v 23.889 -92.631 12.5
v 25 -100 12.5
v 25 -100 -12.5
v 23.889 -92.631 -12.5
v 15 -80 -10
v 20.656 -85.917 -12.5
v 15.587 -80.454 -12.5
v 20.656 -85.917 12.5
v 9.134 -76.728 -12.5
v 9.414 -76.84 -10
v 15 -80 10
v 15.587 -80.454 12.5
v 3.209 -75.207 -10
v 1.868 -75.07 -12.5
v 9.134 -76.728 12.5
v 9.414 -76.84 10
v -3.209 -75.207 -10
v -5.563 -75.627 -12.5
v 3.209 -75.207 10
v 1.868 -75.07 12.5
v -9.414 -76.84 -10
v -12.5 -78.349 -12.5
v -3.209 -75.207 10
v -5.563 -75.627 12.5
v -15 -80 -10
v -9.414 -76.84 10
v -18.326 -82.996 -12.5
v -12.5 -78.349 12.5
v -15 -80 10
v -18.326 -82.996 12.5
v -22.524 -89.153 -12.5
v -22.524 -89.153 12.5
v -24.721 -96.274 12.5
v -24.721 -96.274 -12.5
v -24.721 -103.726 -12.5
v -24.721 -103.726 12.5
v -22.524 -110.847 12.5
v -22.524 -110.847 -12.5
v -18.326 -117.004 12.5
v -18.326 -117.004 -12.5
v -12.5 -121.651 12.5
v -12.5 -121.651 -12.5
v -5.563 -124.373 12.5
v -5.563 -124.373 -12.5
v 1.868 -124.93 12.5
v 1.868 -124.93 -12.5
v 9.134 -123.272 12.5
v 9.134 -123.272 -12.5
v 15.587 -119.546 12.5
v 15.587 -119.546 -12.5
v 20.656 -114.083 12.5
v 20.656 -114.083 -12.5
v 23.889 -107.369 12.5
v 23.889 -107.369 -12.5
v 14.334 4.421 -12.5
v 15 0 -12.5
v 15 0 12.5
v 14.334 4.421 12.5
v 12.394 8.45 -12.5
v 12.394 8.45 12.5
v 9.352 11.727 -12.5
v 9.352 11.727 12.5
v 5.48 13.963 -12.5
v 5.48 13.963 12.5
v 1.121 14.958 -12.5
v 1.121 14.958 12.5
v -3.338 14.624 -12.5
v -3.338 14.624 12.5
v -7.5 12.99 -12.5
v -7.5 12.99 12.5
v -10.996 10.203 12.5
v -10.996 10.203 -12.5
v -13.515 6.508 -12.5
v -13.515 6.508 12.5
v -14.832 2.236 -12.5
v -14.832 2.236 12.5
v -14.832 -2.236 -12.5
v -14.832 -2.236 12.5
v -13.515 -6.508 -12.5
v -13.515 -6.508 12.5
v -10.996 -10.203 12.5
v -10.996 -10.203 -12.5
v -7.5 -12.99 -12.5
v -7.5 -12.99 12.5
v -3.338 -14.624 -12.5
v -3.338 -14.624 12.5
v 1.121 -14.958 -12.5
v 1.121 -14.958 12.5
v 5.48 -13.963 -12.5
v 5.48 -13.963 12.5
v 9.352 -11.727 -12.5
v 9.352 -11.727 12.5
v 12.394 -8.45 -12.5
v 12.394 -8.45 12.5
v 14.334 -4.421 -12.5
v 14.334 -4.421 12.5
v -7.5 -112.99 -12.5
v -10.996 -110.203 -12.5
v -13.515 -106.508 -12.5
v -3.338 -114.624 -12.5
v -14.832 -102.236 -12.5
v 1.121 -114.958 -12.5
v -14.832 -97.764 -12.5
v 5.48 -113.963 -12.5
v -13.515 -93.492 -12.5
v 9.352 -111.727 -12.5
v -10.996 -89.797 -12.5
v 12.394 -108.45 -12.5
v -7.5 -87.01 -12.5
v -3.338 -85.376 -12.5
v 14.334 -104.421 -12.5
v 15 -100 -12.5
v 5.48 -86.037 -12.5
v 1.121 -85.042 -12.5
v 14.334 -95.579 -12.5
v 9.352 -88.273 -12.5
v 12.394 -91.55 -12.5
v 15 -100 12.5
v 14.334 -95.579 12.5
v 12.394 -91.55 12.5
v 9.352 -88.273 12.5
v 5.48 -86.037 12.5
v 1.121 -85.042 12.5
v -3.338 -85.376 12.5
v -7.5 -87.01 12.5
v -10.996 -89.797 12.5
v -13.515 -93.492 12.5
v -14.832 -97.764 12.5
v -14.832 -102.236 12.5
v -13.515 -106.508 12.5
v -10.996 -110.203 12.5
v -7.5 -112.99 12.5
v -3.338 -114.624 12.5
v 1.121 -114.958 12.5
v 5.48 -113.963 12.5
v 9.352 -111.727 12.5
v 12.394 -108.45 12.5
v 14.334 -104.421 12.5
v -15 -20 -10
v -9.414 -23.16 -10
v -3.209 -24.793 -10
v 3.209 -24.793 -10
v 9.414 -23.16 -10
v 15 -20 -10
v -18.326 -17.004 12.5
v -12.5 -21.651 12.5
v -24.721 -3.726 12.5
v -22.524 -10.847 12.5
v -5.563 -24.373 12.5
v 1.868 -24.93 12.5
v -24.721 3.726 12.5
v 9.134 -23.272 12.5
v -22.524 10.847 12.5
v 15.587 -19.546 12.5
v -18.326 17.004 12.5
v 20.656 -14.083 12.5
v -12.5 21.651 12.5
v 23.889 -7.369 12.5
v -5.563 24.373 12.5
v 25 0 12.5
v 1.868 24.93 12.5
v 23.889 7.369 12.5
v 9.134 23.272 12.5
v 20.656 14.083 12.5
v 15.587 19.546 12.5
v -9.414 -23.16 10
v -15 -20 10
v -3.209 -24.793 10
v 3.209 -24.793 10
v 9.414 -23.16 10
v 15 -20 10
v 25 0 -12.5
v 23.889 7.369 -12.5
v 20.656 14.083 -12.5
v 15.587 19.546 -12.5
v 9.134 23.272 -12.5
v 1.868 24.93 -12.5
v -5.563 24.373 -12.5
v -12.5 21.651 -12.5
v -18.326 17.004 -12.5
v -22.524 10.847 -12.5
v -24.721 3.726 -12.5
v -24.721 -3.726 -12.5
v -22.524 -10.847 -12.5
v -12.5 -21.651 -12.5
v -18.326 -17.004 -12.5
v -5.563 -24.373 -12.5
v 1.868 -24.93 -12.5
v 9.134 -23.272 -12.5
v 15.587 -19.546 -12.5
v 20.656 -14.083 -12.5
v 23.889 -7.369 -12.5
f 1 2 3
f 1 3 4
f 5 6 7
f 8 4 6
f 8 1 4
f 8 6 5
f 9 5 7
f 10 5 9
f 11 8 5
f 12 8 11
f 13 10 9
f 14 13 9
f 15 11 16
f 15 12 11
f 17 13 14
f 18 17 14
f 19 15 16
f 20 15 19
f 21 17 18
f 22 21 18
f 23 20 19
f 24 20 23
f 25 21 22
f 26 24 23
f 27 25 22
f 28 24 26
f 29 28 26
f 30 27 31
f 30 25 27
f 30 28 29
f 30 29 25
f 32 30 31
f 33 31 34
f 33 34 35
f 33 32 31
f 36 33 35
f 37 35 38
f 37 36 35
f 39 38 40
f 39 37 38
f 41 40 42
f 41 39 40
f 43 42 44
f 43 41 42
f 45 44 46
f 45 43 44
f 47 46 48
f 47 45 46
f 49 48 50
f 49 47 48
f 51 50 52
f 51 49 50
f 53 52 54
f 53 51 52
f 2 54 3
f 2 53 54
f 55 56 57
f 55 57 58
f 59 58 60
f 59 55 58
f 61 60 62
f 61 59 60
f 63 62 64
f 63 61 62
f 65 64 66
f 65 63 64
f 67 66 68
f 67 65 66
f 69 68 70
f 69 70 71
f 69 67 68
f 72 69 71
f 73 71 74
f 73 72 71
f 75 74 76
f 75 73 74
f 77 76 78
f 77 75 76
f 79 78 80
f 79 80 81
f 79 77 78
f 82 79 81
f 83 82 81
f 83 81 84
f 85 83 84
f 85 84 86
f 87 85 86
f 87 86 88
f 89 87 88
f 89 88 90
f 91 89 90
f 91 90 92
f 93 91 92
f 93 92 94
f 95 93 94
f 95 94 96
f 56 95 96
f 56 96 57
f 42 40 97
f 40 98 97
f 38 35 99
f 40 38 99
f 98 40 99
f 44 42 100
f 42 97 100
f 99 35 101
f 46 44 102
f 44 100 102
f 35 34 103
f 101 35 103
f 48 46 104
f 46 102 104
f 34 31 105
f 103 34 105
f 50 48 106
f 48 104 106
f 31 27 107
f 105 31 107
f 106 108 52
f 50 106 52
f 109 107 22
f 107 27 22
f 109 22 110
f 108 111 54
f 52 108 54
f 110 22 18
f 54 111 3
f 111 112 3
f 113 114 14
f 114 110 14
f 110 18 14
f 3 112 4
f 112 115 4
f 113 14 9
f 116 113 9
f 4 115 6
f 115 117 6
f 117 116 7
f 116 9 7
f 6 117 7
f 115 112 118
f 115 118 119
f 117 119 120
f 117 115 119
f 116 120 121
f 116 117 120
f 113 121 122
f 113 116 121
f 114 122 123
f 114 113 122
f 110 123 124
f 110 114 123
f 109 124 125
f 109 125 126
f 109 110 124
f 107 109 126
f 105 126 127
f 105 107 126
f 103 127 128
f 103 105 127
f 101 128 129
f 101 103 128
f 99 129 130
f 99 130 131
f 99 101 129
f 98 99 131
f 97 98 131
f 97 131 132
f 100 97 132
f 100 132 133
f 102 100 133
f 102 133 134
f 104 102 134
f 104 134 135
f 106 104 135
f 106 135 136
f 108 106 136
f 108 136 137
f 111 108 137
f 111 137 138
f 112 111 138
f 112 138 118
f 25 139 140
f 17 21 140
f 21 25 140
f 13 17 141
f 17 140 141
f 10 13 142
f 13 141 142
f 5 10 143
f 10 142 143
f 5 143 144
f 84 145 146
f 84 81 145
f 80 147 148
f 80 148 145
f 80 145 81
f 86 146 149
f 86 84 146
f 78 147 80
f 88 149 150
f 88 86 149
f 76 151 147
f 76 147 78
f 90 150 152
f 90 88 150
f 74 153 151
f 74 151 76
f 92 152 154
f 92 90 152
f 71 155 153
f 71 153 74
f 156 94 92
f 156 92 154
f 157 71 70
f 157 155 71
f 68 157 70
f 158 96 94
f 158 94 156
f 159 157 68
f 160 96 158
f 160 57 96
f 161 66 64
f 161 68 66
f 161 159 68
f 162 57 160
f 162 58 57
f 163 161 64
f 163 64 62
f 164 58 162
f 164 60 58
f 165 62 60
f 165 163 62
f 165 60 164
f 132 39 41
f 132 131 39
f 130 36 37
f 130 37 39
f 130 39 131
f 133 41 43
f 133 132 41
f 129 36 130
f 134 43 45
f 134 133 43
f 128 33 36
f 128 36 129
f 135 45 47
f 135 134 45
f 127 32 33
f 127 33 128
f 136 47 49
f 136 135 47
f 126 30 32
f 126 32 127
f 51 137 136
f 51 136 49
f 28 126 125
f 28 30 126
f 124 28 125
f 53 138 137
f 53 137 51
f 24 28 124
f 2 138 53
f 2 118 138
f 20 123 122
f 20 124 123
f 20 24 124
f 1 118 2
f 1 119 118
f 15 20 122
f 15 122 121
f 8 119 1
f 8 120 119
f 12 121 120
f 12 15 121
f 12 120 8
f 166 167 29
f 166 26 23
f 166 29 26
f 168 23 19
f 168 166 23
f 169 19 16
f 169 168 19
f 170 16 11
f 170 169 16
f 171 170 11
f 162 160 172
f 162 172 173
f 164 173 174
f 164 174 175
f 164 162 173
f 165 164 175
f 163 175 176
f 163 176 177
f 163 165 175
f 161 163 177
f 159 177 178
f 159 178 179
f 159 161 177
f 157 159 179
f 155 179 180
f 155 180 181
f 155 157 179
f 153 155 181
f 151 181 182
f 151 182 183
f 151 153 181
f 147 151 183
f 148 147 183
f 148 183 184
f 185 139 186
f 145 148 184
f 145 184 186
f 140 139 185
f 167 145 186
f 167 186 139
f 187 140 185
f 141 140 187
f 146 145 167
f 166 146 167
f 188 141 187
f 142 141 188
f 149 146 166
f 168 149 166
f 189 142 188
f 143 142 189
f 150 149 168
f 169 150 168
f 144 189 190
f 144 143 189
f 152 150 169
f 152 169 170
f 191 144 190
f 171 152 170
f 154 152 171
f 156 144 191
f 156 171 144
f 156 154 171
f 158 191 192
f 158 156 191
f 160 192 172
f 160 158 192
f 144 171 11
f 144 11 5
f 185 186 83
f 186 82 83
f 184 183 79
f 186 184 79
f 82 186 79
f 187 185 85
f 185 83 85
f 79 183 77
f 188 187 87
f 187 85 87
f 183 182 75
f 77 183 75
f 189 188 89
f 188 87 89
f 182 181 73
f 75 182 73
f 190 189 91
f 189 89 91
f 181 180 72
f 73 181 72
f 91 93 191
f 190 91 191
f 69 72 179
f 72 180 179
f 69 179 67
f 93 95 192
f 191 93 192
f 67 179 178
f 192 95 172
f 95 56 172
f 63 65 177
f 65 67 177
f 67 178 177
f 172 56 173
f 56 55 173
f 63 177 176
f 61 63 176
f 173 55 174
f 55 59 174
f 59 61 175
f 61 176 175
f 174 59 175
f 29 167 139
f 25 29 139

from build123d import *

# Parameters (mm, degrees)
SKETCH1_R               = 25
SKETCH1_R_2             = 15
BOSS_EXTRUDE1_DEPTH     = 12.5
SKETCH2_W               = 30
SKETCH2_H               = 20
BOSS_EXTRUDE2_DEPTH     = 100
SKETCH3_R               = 25
SKETCH3_R_2             = 15
BOSS_EXTRUDE3_DEPTH     = 12.5
CUT_EXTRUDE1_DEPTH      = 129.086884574
CUT_EXTRUDE1_DEPTH_BACK = 129.086884574
SKETCH4_R               = 15


with BuildPart() as part:
    # Sketch1 → Boss-Extrude1 (new, symmetric)
    with BuildSketch(Plane.XY):
        Circle(SKETCH1_R)
        Circle(SKETCH1_R_2, mode=Mode.SUBTRACT)
    extrude(amount=BOSS_EXTRUDE1_DEPTH, both=True)

    # Sketch2 → Boss-Extrude2 (add)
    with BuildSketch(Plane(origin=(0, 0, 0), x_dir=(1, 0, 0), z_dir=(0, 1, 0))):
        Rectangle(SKETCH2_W, SKETCH2_H)
    extrude(amount=-BOSS_EXTRUDE2_DEPTH)

    # Sketch3 → Boss-Extrude3 (add, symmetric)
    with BuildSketch(Plane.XY):
        with Locations((0, -100)):
            Circle(SKETCH3_R)
        with Locations((0, -100)):
            Circle(SKETCH3_R_2, mode=Mode.SUBTRACT)
    extrude(amount=BOSS_EXTRUDE3_DEPTH, both=True)

    # Sketch4 → Cut-Extrude1 (cut, two sides: drawn at the far end of the back side and taken through both)
    with BuildSketch(Plane.XY.offset(-CUT_EXTRUDE1_DEPTH_BACK)):
        Circle(SKETCH4_R)
        with Locations((0, -100)):
            Circle(SKETCH4_R)
    extrude(amount=CUT_EXTRUDE1_DEPTH + CUT_EXTRUDE1_DEPTH_BACK, mode=Mode.SUBTRACT)


solid = part.part
